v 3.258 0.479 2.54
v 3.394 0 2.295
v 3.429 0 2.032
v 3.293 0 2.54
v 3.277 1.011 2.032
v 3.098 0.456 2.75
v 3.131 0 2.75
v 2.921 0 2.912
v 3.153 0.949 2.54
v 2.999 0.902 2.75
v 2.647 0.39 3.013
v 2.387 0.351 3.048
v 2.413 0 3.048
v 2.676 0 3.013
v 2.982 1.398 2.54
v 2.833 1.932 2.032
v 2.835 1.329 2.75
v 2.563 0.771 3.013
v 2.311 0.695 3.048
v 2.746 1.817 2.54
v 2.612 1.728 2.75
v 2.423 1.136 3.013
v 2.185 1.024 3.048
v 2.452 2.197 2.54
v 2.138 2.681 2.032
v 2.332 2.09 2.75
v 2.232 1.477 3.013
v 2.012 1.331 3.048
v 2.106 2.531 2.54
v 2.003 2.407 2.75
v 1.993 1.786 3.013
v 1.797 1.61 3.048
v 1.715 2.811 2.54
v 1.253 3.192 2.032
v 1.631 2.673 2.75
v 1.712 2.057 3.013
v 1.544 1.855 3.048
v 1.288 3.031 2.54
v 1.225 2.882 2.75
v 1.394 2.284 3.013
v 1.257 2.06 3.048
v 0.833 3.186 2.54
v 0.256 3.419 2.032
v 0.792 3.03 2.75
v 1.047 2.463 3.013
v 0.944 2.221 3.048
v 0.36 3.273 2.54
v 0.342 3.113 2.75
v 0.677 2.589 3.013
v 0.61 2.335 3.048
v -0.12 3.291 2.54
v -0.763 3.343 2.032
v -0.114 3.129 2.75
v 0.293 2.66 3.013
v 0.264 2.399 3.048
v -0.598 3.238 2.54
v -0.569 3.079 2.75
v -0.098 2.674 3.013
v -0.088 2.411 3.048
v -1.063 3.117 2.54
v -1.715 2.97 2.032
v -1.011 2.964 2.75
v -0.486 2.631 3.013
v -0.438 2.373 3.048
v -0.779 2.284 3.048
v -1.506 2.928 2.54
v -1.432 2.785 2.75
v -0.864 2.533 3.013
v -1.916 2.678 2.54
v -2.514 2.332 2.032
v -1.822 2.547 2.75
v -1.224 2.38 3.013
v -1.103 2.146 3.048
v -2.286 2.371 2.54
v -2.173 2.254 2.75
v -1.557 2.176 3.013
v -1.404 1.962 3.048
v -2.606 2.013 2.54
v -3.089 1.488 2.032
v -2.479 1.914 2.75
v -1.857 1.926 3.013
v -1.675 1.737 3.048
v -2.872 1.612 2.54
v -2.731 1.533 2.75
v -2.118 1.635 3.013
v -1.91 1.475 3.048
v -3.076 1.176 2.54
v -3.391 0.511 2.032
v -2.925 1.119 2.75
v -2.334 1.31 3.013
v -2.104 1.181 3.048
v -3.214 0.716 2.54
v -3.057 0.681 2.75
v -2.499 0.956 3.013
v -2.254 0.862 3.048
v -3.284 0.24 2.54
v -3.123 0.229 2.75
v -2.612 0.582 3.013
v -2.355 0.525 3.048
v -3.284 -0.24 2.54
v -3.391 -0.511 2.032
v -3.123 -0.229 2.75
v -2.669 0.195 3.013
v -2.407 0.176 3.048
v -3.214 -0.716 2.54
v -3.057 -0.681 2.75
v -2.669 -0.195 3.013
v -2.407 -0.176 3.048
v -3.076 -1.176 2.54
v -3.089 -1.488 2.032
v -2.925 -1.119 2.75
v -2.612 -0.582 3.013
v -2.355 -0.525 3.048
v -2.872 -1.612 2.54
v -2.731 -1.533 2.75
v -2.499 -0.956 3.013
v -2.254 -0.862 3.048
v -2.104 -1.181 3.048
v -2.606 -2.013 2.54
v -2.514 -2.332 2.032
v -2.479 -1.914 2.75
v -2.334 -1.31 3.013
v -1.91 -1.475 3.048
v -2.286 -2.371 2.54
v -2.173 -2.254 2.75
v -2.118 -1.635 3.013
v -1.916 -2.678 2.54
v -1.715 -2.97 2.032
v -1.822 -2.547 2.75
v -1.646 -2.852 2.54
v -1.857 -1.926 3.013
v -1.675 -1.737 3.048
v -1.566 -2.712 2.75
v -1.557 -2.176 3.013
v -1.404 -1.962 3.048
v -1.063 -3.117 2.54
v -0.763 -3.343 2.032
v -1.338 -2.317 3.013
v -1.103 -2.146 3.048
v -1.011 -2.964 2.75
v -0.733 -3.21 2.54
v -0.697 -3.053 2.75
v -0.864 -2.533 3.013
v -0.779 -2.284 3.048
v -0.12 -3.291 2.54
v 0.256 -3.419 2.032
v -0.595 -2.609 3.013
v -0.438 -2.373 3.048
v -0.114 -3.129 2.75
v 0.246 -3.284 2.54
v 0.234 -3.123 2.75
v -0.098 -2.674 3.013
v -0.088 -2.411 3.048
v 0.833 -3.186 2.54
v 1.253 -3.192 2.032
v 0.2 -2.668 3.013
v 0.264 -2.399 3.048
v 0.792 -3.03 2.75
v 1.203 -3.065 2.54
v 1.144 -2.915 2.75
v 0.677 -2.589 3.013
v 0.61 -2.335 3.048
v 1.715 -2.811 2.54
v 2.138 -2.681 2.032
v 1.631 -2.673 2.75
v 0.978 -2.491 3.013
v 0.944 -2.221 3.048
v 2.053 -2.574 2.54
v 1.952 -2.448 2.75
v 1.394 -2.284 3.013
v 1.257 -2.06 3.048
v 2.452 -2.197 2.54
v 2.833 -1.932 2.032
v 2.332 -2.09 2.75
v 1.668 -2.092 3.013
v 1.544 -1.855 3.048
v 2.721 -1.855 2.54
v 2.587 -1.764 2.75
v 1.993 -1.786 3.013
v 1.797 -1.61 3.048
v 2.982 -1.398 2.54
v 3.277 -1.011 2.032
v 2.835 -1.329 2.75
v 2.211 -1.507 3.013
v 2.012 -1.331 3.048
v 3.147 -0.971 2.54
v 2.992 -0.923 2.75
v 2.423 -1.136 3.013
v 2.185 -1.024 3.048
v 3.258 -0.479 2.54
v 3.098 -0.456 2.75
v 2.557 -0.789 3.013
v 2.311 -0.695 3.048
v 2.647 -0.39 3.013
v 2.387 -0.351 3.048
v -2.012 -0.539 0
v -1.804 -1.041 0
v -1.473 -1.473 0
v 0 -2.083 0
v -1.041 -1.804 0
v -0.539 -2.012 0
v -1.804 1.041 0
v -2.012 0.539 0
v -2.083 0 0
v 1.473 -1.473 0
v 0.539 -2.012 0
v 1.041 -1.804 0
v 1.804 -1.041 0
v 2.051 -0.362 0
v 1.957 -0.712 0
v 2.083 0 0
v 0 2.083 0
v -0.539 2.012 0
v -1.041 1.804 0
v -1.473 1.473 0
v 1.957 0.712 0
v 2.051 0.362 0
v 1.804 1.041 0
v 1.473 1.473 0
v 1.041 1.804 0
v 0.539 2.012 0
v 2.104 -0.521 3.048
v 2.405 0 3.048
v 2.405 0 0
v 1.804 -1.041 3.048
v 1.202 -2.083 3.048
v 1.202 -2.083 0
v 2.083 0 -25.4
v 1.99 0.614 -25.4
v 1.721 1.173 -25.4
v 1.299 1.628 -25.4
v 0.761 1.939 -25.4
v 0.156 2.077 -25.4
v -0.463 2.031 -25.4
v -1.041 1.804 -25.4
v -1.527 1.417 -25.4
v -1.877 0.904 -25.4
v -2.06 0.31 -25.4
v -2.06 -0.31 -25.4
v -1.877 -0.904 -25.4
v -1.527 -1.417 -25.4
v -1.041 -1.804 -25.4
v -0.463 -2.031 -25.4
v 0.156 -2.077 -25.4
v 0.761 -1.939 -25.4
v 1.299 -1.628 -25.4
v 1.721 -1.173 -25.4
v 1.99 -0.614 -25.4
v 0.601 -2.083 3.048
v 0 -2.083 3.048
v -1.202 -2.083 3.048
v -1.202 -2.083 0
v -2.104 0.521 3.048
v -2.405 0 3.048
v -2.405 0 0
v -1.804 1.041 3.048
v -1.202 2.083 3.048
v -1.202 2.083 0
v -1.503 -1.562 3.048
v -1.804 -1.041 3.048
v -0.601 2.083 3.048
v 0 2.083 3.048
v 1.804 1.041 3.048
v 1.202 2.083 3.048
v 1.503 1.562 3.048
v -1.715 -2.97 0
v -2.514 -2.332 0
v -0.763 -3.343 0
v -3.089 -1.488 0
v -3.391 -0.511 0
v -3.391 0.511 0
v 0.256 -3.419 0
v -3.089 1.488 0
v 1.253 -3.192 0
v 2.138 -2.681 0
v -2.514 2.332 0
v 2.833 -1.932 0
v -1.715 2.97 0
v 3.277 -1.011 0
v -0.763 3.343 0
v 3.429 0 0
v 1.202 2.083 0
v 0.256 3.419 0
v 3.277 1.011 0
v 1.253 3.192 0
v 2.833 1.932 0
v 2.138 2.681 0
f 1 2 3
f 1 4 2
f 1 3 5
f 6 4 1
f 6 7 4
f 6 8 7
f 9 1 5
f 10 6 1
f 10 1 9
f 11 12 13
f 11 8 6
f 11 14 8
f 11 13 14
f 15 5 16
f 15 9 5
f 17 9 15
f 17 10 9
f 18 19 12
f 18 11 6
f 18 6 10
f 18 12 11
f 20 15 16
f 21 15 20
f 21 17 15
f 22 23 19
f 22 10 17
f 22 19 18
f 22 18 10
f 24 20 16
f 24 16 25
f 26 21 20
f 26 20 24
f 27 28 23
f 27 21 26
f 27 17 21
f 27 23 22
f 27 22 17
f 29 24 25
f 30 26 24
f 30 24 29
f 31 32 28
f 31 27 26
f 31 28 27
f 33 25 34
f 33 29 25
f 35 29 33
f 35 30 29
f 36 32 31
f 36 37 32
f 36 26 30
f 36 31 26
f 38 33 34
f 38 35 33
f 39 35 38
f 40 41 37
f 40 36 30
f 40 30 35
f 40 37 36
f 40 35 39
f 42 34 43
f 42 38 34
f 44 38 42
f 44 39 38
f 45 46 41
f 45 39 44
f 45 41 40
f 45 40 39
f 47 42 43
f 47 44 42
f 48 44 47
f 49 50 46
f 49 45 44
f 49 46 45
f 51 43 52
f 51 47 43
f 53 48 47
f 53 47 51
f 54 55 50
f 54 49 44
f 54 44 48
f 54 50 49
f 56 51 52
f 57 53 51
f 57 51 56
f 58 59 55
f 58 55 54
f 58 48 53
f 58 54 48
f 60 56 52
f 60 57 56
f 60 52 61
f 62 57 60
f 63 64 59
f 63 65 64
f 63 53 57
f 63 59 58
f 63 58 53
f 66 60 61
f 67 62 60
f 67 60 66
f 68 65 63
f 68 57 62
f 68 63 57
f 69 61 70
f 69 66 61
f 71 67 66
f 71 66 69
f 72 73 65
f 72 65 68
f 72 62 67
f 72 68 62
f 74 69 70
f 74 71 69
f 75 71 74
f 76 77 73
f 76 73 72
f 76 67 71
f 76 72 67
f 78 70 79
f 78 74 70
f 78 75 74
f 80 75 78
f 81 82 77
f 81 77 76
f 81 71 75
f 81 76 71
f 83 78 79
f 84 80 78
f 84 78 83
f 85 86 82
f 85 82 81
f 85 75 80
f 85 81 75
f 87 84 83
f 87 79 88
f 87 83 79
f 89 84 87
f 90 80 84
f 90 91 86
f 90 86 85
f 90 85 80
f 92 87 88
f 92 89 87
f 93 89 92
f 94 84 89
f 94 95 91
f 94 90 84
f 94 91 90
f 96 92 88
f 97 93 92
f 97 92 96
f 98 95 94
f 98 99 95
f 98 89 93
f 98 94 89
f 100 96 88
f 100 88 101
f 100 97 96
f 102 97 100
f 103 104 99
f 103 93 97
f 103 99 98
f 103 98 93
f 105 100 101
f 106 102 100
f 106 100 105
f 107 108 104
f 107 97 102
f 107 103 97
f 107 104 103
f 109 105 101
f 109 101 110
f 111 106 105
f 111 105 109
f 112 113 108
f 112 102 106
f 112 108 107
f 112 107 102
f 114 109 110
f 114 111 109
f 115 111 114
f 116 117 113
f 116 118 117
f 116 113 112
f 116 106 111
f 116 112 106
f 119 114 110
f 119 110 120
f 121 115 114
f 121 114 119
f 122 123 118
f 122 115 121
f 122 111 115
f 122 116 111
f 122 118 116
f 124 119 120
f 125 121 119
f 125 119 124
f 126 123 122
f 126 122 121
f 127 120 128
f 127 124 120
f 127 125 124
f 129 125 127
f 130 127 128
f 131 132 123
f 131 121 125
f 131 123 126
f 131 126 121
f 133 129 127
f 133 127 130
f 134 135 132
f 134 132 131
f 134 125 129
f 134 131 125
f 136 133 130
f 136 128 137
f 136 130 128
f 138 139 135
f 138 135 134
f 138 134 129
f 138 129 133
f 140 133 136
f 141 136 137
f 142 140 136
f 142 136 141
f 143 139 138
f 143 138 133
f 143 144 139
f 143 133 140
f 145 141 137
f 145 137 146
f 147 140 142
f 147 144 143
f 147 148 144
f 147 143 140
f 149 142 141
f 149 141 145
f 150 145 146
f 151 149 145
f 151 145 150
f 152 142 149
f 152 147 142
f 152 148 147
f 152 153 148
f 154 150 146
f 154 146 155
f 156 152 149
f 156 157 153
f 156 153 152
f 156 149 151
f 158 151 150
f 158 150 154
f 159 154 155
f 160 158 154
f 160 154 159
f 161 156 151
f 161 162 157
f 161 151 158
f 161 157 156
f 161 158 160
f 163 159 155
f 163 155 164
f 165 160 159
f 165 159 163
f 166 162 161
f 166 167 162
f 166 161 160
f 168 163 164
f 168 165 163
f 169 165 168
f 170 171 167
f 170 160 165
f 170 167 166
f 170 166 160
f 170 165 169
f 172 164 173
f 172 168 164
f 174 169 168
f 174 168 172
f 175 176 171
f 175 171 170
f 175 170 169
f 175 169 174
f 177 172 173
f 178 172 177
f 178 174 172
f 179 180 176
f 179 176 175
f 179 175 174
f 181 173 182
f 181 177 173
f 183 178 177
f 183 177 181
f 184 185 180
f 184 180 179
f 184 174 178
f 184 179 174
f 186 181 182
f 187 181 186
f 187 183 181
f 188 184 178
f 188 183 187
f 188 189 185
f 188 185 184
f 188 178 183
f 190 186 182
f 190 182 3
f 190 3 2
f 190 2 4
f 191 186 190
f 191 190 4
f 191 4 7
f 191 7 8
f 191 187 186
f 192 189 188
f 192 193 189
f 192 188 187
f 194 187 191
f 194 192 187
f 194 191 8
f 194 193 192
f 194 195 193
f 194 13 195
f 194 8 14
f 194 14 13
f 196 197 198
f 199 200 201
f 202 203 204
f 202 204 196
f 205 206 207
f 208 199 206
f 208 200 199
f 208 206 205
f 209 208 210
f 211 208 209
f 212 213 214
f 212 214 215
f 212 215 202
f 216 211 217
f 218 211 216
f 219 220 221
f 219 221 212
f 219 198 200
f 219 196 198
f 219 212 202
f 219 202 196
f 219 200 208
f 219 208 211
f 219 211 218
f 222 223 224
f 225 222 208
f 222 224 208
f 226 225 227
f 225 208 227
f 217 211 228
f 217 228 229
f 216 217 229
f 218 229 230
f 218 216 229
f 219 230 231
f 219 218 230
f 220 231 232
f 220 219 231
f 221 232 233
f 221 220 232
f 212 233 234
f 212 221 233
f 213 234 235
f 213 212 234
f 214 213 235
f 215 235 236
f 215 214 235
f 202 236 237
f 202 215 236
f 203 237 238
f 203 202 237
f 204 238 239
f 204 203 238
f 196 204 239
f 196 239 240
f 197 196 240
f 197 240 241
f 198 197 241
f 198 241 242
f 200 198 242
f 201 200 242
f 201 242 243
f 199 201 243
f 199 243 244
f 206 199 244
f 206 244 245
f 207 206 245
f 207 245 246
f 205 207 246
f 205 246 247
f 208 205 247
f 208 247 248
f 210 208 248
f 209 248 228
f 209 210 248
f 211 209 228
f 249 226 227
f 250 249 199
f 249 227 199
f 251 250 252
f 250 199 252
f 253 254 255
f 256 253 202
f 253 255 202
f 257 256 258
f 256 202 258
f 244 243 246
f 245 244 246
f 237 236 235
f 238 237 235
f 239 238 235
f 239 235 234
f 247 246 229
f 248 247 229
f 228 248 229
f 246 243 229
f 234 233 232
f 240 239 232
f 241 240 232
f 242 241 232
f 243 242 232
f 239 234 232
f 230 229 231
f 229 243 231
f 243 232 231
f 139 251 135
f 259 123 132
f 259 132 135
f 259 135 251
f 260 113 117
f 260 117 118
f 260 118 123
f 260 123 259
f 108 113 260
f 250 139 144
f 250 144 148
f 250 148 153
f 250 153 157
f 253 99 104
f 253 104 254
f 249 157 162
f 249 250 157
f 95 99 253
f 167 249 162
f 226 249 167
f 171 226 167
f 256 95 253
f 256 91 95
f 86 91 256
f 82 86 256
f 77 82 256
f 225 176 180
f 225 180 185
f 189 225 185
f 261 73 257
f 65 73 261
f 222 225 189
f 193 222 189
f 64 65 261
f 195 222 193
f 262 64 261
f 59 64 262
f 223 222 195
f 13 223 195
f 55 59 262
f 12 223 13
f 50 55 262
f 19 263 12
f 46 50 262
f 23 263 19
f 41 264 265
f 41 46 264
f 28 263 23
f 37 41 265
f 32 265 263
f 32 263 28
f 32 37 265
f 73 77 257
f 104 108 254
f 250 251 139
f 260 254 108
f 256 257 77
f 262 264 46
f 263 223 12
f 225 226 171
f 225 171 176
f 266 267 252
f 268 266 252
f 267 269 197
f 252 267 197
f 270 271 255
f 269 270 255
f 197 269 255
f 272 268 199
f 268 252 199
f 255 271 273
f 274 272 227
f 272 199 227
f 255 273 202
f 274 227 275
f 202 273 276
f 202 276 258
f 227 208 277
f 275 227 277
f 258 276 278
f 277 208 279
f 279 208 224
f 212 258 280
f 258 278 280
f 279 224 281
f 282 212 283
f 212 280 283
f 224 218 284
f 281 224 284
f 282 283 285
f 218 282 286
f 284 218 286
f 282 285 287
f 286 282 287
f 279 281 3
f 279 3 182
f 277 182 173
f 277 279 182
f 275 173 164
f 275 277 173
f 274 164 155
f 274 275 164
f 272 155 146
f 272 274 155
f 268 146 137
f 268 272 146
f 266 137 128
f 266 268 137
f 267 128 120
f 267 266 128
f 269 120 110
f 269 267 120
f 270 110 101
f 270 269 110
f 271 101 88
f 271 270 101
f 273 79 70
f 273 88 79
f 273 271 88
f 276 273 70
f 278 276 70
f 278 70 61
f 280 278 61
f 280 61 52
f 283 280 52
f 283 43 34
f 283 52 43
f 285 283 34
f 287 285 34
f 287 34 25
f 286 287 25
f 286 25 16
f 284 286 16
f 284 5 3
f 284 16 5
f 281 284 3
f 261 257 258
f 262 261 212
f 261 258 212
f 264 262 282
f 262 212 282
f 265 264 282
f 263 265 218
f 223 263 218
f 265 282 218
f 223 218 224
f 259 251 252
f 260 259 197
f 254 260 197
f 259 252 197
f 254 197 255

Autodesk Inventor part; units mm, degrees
ref_plane "YZ Plane" through (0, 0, 0) normal (1, 0, 0) x (0, 1, 0)
ref_plane "XZ Plane" through (0, 0, 0) normal (0, 1, 0) x (-1, 0, 0)
ref_plane "XY Plane" through (0, 0, 0) normal (0, 0, 1) x (1, 0, 0)
sketch "Sketch1" plane through (0, 0, 0) normal (0, 0, 1) x (1, 0, 0)
  circle A0 centre (0, 0) radius 3.429
  circle A1 centre (0, 0) radius 2.0828
  line L0 (1.2025, 2.0828) -> (2.405, 0)
  line L1 (2.405, 0) -> (1.2025, -2.0828)
  line L2 (1.2025, -2.0828) -> (-1.2025, -2.0828)
  line L3 (-1.2025, -2.0828) -> (-2.405, 0)
  line L4 (-2.405, 0) -> (-1.2025, 2.0828)
  line L5 (-1.2025, 2.0828) -> (1.2025, 2.0828)
  dimension "d0" = 4.1656
  dimension "d1" = 6.858
extrude "Extrusion1" add sketch "Sketch1" against normal blind 25.4 contours A1
extrude "Extrusion2" add sketch "Sketch1" along normal blind 3.048
thread "Thread1" size "8-32 UNC" class "2A" standard "ANSI Unified Screw Threads" full length
fillet "Fillet1" radius 1.016 1 edges at (-3.429, 0, 3.048)
properties part number "Bolt 8-32 bracket BD Drill motor mount"
